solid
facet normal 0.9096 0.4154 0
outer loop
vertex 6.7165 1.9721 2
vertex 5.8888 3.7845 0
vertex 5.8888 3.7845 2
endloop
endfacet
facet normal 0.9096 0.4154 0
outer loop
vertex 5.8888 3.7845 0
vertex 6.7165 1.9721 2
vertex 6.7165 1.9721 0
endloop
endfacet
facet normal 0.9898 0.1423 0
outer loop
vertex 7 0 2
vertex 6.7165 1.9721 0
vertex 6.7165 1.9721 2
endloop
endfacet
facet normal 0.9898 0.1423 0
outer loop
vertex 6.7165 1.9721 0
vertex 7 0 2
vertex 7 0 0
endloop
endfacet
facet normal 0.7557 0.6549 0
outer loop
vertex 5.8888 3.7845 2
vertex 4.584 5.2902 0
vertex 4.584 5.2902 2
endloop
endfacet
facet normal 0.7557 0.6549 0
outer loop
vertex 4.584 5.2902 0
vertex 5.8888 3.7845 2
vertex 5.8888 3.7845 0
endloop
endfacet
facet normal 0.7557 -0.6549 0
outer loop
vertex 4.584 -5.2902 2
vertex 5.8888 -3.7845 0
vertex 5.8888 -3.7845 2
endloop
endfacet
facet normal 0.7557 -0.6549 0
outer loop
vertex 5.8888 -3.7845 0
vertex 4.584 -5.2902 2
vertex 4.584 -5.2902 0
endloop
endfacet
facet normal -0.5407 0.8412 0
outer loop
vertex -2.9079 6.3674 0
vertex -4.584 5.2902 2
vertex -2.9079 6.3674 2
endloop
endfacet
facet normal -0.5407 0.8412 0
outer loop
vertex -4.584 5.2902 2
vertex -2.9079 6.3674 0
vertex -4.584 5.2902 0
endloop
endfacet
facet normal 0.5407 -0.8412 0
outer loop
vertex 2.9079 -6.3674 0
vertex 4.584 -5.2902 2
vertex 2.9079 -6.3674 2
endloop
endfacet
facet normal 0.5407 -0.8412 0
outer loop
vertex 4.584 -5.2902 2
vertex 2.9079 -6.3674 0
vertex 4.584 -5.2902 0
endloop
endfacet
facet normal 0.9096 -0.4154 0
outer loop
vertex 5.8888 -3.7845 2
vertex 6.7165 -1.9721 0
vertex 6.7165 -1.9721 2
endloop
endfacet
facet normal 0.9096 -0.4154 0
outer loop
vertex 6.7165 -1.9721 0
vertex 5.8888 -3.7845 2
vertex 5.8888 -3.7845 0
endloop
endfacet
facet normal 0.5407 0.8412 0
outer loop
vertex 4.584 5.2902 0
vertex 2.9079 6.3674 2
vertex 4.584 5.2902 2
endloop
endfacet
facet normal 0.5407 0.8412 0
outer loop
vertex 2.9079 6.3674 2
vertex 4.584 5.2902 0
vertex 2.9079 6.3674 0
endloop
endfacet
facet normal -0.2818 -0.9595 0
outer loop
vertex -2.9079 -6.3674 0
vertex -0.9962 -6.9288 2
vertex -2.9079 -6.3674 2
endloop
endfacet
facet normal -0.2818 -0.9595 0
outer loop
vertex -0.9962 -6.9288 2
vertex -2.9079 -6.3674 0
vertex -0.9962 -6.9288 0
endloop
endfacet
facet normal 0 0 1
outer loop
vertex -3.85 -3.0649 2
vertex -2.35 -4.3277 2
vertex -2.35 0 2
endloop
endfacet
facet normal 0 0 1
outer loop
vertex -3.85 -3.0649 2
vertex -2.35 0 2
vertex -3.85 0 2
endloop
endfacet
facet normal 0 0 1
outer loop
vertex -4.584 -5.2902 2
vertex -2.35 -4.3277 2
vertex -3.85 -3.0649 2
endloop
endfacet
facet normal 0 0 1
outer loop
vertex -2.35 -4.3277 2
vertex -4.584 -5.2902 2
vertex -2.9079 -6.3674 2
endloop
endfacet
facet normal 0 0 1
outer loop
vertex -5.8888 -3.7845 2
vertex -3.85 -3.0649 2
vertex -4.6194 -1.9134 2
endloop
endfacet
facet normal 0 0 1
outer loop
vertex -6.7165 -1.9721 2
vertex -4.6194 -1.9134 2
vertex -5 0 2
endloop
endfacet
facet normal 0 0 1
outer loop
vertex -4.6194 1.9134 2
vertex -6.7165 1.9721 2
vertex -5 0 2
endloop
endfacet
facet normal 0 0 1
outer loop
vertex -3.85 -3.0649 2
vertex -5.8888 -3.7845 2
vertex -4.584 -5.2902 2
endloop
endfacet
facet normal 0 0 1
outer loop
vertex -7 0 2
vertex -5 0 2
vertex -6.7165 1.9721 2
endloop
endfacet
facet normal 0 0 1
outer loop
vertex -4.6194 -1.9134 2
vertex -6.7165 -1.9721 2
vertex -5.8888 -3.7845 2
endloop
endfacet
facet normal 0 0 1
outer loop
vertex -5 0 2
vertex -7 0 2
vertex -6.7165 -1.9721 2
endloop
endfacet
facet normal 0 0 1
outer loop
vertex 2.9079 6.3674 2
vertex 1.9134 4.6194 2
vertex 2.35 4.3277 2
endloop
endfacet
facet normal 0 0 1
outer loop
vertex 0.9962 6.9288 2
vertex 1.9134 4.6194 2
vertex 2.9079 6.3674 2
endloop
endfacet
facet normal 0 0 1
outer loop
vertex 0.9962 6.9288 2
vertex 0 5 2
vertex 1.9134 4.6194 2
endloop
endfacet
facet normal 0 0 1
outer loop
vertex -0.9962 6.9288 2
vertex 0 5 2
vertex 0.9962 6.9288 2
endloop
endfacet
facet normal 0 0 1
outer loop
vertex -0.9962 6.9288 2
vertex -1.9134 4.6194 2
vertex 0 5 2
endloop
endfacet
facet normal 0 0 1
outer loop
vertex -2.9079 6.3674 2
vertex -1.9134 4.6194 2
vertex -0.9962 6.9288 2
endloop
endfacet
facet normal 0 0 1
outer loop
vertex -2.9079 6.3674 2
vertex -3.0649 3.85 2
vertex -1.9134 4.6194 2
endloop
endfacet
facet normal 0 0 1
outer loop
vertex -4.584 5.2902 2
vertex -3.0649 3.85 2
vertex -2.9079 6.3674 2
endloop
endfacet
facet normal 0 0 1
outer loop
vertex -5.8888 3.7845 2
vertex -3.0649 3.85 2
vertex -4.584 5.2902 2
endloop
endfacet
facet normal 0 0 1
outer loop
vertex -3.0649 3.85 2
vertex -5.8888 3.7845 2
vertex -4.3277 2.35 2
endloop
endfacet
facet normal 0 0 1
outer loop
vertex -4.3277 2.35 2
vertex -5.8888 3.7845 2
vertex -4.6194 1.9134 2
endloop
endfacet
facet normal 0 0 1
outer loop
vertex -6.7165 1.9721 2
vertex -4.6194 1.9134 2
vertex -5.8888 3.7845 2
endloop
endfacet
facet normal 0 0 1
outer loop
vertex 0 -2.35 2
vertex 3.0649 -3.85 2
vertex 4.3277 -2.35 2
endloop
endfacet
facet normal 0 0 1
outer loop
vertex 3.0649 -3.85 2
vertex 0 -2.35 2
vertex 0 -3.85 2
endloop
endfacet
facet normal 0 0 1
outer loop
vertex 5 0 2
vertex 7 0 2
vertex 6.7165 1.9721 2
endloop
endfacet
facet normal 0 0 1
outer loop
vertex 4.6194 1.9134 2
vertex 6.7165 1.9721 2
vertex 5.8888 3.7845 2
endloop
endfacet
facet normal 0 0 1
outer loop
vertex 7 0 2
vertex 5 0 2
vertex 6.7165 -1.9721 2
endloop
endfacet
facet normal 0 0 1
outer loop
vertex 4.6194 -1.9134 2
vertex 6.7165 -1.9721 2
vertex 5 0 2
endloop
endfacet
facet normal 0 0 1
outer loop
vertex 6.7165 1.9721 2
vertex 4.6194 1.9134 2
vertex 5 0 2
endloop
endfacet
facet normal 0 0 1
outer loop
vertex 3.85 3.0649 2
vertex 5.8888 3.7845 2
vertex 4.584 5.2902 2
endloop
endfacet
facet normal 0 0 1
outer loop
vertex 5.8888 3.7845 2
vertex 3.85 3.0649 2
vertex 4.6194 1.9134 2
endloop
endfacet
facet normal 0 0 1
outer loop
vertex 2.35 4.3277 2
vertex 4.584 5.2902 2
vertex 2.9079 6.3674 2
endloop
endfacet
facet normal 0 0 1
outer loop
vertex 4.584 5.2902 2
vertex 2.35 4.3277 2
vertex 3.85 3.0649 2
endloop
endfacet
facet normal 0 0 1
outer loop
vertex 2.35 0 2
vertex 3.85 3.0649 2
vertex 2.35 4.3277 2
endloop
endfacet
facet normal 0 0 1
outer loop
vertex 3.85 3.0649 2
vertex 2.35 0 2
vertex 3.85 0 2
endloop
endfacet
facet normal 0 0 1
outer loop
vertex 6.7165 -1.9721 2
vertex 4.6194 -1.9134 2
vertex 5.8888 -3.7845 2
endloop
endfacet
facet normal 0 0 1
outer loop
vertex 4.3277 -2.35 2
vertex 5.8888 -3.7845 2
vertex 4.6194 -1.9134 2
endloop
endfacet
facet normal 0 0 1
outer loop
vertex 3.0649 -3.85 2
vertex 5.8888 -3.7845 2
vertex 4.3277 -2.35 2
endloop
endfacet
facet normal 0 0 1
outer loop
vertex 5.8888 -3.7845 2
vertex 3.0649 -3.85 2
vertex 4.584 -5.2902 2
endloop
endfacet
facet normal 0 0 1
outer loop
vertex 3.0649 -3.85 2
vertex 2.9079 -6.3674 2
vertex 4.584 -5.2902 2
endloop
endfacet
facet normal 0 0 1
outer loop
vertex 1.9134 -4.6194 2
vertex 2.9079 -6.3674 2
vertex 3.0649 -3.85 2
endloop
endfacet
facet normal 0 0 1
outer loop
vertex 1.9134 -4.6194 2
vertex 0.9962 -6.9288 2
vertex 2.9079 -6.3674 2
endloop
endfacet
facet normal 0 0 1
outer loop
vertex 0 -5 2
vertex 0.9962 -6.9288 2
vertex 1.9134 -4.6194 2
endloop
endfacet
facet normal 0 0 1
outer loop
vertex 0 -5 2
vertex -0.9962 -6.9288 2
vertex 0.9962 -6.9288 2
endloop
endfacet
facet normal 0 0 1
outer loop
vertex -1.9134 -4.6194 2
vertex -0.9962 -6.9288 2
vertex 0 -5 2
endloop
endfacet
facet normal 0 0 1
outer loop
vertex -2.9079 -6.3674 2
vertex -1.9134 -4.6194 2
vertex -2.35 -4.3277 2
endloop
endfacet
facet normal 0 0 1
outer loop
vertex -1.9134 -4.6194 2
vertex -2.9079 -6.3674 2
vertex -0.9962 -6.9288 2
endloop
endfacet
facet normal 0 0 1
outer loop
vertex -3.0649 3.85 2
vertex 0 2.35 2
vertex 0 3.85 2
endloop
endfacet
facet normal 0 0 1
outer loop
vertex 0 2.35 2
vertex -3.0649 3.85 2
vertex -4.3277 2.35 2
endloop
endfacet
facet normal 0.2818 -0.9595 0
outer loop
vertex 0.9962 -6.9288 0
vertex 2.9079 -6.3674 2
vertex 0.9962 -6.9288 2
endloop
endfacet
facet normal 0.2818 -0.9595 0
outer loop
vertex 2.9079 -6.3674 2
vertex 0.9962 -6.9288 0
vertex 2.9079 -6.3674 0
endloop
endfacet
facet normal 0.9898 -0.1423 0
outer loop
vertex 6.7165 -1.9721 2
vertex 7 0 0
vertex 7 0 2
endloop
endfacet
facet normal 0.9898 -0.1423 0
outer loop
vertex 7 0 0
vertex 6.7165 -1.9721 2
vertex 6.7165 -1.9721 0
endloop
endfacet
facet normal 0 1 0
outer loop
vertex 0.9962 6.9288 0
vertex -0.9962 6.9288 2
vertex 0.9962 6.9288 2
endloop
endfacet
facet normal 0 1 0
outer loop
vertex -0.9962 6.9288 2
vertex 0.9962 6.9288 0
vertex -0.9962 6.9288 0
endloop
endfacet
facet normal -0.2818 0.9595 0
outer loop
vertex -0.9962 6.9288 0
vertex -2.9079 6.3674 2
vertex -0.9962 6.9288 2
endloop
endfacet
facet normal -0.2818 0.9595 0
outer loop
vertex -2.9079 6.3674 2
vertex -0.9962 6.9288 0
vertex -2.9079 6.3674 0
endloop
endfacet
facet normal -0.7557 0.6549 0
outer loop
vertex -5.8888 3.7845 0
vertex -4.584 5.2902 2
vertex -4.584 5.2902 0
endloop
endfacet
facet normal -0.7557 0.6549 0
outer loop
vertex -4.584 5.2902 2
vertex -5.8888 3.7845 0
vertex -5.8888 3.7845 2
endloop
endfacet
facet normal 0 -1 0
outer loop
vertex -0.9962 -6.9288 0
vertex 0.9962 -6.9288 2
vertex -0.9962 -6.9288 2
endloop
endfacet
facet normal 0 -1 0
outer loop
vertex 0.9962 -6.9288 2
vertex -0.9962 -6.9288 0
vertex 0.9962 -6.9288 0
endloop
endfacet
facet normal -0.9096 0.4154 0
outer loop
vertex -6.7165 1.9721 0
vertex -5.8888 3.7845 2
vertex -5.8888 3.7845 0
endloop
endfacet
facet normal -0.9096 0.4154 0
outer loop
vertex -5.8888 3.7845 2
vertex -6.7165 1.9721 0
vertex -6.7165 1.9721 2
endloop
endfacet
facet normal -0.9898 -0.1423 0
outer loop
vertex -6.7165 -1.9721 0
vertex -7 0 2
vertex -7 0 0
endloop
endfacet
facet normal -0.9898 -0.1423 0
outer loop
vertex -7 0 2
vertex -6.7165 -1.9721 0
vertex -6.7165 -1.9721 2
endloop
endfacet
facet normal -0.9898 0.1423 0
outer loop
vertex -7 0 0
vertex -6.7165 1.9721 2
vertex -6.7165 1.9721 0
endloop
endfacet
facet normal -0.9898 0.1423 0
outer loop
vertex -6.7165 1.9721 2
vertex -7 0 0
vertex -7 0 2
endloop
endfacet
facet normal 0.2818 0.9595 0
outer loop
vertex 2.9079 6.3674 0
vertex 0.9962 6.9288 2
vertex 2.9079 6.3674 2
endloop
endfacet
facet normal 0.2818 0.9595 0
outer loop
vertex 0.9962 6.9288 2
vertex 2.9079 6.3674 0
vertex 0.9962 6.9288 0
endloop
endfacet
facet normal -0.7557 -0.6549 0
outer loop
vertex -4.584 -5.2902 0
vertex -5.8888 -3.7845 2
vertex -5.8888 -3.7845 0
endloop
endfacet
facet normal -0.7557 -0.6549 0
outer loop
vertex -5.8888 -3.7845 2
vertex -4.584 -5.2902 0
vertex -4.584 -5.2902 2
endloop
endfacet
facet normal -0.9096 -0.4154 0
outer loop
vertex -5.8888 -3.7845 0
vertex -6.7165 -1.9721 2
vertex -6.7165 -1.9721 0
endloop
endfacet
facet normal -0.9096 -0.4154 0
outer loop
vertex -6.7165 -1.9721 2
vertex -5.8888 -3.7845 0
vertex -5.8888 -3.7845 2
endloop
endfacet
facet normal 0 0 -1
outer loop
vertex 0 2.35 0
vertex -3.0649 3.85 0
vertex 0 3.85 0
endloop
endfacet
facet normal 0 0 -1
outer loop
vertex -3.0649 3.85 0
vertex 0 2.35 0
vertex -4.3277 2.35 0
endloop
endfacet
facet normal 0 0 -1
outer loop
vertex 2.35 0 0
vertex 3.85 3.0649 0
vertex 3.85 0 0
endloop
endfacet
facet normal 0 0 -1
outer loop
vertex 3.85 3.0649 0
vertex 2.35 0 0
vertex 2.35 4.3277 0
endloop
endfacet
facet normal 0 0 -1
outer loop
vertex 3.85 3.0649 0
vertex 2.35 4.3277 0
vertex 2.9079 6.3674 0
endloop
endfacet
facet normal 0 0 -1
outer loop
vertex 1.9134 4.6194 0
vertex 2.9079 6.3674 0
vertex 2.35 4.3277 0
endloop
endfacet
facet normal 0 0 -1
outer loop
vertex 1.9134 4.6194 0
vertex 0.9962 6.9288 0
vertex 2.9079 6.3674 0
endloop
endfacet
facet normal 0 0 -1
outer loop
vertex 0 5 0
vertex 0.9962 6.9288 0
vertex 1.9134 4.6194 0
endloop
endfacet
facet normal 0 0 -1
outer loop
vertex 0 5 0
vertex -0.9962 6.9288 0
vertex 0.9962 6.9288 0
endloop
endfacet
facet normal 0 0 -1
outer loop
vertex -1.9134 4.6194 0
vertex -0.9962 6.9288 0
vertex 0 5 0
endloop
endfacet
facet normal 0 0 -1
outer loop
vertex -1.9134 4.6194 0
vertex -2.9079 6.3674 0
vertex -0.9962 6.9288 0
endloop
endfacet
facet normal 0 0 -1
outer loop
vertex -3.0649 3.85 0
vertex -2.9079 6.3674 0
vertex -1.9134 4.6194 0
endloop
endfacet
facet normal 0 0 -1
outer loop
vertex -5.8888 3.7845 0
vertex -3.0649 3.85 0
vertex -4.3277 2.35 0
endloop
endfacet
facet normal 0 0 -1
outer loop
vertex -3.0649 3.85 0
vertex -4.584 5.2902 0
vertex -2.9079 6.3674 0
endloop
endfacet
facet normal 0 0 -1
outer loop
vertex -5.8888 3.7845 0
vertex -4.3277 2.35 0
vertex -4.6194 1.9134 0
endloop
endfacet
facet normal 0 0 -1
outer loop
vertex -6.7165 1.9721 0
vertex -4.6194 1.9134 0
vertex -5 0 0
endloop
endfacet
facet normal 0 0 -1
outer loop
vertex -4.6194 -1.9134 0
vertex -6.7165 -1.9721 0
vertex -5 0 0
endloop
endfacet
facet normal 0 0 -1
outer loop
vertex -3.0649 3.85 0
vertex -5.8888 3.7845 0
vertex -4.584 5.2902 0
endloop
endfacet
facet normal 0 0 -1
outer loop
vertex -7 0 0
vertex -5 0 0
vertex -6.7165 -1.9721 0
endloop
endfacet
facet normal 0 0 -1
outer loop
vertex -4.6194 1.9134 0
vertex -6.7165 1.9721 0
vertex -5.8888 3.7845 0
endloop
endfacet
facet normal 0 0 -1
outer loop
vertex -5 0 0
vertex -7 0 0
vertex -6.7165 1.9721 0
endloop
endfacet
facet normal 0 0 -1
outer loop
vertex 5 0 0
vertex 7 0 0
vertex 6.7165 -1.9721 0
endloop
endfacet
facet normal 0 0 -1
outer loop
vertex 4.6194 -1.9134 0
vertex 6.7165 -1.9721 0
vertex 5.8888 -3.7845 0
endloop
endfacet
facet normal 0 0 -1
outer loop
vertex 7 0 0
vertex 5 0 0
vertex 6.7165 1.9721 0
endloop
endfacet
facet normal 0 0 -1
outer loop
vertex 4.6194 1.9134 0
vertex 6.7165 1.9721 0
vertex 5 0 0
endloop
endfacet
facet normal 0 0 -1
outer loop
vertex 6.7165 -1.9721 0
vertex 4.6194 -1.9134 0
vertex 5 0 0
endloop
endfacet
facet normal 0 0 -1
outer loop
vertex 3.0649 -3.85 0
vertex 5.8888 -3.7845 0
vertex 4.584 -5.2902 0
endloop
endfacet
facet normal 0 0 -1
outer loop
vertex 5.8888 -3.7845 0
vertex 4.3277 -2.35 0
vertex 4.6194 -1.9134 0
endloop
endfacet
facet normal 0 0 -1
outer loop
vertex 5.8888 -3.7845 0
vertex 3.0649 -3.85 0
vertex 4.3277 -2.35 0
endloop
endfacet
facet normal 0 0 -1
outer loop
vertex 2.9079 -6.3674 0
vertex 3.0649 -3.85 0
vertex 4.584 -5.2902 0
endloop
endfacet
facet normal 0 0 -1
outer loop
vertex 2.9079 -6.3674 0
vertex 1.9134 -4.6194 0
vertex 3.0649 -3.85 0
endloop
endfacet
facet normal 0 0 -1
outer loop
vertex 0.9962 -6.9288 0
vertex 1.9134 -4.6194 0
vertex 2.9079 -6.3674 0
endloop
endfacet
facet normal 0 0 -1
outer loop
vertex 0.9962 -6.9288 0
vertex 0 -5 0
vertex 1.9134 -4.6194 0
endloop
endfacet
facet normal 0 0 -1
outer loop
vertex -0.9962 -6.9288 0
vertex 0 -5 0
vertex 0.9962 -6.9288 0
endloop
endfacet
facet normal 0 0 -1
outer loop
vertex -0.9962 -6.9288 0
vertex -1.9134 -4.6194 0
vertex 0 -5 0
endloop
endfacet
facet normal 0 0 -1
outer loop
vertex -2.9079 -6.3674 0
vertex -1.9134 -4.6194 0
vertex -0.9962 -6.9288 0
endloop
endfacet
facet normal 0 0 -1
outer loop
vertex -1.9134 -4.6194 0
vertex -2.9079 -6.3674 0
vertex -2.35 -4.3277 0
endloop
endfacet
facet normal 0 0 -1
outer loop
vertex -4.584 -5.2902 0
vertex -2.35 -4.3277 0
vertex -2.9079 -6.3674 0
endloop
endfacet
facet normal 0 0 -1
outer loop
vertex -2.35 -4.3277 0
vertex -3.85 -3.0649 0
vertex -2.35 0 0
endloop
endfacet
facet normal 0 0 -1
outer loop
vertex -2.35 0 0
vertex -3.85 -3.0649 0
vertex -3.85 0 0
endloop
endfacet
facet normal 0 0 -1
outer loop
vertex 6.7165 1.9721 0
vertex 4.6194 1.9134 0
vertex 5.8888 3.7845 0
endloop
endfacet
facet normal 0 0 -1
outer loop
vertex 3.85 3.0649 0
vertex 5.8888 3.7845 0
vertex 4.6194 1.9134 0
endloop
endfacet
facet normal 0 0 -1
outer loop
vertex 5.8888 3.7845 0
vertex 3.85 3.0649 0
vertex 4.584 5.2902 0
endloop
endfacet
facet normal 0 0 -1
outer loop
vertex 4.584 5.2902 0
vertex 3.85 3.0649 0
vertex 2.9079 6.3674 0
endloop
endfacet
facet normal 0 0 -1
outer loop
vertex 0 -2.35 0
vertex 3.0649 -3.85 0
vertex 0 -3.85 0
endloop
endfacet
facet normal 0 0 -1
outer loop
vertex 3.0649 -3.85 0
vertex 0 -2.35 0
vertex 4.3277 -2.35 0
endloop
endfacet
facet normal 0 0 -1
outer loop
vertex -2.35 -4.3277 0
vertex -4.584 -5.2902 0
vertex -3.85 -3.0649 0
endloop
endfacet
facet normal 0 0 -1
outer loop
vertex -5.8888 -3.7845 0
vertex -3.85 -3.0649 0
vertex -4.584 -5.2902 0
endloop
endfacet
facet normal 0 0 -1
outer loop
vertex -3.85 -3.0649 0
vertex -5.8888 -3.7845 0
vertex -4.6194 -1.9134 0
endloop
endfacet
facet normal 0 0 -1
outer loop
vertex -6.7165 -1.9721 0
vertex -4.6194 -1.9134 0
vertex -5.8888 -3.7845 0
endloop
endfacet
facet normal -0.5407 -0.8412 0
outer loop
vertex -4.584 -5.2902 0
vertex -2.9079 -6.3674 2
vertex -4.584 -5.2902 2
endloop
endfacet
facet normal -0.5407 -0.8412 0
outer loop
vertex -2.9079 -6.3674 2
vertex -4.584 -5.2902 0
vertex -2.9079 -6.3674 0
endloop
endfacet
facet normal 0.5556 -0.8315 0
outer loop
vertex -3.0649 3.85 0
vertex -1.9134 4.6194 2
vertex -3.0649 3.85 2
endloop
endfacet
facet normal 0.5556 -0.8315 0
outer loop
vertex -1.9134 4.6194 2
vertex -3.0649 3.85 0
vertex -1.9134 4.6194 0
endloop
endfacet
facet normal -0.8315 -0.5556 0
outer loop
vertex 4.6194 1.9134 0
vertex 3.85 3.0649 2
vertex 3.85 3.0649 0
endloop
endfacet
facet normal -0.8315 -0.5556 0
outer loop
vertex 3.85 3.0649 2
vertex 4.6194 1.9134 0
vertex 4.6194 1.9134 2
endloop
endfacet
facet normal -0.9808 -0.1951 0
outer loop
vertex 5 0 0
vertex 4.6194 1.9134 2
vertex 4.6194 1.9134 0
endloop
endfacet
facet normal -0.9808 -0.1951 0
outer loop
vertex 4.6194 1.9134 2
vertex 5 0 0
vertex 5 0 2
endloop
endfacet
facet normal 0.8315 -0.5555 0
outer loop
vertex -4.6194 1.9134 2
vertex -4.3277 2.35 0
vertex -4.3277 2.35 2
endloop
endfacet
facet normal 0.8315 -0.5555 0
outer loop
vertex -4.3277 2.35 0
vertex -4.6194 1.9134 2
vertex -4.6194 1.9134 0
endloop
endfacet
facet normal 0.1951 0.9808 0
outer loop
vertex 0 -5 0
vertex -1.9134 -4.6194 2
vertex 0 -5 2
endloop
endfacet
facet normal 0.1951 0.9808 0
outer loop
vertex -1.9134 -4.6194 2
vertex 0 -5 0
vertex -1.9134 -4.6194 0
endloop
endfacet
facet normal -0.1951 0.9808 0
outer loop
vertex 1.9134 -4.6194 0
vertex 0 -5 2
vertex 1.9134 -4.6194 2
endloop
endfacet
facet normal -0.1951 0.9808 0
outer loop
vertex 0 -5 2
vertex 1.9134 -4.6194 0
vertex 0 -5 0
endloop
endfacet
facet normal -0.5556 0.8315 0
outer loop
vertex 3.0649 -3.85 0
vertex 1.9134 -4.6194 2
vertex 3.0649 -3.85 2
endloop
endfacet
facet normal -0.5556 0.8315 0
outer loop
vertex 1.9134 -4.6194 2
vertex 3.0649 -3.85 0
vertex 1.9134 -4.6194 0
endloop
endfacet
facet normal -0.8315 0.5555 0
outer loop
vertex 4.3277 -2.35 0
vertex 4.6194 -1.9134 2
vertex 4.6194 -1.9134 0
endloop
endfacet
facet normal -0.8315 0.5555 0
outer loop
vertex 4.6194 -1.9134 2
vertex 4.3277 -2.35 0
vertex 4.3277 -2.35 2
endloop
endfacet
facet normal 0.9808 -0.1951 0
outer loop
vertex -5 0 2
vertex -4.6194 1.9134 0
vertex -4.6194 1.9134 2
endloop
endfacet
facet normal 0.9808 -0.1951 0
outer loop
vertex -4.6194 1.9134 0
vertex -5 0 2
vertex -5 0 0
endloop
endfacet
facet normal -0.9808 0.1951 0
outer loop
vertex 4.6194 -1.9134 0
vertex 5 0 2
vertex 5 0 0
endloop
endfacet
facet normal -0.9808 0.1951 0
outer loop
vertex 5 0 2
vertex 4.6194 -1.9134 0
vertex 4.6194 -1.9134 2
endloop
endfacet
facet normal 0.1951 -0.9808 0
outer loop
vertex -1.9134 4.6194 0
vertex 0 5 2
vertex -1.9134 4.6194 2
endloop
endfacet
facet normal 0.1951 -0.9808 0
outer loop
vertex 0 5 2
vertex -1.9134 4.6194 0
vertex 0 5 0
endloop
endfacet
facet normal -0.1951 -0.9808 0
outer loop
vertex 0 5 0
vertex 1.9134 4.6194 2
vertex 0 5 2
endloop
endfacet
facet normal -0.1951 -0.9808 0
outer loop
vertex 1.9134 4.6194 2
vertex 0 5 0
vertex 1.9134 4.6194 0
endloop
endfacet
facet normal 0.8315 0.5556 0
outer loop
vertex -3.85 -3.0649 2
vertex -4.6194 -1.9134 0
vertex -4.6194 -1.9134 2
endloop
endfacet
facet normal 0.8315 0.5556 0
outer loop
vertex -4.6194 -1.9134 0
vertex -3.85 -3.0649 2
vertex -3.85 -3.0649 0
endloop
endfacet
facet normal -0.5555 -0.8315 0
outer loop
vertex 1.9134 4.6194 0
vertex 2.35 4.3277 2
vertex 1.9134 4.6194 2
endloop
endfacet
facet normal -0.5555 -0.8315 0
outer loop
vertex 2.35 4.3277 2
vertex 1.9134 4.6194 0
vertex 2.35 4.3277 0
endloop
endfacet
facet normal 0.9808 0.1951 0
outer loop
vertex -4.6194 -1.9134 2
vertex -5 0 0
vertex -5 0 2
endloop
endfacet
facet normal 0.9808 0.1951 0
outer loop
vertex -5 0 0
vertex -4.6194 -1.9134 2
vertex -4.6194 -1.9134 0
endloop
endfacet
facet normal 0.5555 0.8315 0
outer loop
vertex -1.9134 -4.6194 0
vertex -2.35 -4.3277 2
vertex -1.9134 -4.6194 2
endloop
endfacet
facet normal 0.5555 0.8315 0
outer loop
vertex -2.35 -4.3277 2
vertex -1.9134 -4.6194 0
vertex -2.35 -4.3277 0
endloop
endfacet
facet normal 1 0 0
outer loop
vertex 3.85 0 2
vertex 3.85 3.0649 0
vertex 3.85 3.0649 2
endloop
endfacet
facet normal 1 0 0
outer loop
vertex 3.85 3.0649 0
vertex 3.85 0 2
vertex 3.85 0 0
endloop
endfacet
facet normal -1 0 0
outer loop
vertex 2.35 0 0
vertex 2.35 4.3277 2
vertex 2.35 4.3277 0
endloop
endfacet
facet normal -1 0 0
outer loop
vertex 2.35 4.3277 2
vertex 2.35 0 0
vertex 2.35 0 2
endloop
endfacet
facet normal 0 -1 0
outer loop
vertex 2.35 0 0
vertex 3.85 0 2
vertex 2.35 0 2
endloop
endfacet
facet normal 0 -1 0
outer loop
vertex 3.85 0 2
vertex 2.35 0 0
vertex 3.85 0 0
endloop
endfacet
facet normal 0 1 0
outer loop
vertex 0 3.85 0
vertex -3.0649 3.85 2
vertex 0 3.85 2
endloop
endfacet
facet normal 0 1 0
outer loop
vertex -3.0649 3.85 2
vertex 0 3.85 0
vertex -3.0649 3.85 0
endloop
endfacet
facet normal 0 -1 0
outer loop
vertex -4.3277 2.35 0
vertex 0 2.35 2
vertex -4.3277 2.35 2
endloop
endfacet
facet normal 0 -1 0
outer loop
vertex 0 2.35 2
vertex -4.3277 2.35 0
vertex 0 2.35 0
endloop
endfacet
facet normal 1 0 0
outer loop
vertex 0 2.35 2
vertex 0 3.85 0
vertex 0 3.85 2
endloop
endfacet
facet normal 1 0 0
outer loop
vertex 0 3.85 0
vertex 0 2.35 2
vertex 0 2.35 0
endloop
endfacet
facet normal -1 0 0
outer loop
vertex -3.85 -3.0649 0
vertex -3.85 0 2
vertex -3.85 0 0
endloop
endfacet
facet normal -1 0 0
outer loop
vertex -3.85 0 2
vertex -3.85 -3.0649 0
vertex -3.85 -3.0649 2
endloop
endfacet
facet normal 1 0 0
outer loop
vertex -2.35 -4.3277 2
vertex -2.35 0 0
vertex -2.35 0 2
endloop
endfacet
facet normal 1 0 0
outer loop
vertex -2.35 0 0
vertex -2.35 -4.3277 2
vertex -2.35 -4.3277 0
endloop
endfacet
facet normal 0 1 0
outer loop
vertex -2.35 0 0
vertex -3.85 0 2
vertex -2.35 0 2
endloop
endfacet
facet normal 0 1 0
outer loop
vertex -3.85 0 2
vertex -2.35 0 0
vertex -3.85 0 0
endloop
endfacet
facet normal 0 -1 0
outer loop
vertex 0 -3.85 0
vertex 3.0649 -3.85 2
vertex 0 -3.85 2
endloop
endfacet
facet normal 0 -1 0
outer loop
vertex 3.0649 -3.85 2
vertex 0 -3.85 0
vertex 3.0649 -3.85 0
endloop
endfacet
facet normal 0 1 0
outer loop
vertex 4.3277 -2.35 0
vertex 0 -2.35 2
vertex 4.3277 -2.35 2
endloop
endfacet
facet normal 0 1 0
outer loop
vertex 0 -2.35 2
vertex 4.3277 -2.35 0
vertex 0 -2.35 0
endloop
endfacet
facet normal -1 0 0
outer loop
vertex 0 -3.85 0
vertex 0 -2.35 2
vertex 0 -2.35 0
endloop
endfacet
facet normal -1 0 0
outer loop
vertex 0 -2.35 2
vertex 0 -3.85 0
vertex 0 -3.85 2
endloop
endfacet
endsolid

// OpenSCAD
// this file just pulls out one module from picamera_2

use <./picamera_2.scad>

picamera_2_lens_gripper();
